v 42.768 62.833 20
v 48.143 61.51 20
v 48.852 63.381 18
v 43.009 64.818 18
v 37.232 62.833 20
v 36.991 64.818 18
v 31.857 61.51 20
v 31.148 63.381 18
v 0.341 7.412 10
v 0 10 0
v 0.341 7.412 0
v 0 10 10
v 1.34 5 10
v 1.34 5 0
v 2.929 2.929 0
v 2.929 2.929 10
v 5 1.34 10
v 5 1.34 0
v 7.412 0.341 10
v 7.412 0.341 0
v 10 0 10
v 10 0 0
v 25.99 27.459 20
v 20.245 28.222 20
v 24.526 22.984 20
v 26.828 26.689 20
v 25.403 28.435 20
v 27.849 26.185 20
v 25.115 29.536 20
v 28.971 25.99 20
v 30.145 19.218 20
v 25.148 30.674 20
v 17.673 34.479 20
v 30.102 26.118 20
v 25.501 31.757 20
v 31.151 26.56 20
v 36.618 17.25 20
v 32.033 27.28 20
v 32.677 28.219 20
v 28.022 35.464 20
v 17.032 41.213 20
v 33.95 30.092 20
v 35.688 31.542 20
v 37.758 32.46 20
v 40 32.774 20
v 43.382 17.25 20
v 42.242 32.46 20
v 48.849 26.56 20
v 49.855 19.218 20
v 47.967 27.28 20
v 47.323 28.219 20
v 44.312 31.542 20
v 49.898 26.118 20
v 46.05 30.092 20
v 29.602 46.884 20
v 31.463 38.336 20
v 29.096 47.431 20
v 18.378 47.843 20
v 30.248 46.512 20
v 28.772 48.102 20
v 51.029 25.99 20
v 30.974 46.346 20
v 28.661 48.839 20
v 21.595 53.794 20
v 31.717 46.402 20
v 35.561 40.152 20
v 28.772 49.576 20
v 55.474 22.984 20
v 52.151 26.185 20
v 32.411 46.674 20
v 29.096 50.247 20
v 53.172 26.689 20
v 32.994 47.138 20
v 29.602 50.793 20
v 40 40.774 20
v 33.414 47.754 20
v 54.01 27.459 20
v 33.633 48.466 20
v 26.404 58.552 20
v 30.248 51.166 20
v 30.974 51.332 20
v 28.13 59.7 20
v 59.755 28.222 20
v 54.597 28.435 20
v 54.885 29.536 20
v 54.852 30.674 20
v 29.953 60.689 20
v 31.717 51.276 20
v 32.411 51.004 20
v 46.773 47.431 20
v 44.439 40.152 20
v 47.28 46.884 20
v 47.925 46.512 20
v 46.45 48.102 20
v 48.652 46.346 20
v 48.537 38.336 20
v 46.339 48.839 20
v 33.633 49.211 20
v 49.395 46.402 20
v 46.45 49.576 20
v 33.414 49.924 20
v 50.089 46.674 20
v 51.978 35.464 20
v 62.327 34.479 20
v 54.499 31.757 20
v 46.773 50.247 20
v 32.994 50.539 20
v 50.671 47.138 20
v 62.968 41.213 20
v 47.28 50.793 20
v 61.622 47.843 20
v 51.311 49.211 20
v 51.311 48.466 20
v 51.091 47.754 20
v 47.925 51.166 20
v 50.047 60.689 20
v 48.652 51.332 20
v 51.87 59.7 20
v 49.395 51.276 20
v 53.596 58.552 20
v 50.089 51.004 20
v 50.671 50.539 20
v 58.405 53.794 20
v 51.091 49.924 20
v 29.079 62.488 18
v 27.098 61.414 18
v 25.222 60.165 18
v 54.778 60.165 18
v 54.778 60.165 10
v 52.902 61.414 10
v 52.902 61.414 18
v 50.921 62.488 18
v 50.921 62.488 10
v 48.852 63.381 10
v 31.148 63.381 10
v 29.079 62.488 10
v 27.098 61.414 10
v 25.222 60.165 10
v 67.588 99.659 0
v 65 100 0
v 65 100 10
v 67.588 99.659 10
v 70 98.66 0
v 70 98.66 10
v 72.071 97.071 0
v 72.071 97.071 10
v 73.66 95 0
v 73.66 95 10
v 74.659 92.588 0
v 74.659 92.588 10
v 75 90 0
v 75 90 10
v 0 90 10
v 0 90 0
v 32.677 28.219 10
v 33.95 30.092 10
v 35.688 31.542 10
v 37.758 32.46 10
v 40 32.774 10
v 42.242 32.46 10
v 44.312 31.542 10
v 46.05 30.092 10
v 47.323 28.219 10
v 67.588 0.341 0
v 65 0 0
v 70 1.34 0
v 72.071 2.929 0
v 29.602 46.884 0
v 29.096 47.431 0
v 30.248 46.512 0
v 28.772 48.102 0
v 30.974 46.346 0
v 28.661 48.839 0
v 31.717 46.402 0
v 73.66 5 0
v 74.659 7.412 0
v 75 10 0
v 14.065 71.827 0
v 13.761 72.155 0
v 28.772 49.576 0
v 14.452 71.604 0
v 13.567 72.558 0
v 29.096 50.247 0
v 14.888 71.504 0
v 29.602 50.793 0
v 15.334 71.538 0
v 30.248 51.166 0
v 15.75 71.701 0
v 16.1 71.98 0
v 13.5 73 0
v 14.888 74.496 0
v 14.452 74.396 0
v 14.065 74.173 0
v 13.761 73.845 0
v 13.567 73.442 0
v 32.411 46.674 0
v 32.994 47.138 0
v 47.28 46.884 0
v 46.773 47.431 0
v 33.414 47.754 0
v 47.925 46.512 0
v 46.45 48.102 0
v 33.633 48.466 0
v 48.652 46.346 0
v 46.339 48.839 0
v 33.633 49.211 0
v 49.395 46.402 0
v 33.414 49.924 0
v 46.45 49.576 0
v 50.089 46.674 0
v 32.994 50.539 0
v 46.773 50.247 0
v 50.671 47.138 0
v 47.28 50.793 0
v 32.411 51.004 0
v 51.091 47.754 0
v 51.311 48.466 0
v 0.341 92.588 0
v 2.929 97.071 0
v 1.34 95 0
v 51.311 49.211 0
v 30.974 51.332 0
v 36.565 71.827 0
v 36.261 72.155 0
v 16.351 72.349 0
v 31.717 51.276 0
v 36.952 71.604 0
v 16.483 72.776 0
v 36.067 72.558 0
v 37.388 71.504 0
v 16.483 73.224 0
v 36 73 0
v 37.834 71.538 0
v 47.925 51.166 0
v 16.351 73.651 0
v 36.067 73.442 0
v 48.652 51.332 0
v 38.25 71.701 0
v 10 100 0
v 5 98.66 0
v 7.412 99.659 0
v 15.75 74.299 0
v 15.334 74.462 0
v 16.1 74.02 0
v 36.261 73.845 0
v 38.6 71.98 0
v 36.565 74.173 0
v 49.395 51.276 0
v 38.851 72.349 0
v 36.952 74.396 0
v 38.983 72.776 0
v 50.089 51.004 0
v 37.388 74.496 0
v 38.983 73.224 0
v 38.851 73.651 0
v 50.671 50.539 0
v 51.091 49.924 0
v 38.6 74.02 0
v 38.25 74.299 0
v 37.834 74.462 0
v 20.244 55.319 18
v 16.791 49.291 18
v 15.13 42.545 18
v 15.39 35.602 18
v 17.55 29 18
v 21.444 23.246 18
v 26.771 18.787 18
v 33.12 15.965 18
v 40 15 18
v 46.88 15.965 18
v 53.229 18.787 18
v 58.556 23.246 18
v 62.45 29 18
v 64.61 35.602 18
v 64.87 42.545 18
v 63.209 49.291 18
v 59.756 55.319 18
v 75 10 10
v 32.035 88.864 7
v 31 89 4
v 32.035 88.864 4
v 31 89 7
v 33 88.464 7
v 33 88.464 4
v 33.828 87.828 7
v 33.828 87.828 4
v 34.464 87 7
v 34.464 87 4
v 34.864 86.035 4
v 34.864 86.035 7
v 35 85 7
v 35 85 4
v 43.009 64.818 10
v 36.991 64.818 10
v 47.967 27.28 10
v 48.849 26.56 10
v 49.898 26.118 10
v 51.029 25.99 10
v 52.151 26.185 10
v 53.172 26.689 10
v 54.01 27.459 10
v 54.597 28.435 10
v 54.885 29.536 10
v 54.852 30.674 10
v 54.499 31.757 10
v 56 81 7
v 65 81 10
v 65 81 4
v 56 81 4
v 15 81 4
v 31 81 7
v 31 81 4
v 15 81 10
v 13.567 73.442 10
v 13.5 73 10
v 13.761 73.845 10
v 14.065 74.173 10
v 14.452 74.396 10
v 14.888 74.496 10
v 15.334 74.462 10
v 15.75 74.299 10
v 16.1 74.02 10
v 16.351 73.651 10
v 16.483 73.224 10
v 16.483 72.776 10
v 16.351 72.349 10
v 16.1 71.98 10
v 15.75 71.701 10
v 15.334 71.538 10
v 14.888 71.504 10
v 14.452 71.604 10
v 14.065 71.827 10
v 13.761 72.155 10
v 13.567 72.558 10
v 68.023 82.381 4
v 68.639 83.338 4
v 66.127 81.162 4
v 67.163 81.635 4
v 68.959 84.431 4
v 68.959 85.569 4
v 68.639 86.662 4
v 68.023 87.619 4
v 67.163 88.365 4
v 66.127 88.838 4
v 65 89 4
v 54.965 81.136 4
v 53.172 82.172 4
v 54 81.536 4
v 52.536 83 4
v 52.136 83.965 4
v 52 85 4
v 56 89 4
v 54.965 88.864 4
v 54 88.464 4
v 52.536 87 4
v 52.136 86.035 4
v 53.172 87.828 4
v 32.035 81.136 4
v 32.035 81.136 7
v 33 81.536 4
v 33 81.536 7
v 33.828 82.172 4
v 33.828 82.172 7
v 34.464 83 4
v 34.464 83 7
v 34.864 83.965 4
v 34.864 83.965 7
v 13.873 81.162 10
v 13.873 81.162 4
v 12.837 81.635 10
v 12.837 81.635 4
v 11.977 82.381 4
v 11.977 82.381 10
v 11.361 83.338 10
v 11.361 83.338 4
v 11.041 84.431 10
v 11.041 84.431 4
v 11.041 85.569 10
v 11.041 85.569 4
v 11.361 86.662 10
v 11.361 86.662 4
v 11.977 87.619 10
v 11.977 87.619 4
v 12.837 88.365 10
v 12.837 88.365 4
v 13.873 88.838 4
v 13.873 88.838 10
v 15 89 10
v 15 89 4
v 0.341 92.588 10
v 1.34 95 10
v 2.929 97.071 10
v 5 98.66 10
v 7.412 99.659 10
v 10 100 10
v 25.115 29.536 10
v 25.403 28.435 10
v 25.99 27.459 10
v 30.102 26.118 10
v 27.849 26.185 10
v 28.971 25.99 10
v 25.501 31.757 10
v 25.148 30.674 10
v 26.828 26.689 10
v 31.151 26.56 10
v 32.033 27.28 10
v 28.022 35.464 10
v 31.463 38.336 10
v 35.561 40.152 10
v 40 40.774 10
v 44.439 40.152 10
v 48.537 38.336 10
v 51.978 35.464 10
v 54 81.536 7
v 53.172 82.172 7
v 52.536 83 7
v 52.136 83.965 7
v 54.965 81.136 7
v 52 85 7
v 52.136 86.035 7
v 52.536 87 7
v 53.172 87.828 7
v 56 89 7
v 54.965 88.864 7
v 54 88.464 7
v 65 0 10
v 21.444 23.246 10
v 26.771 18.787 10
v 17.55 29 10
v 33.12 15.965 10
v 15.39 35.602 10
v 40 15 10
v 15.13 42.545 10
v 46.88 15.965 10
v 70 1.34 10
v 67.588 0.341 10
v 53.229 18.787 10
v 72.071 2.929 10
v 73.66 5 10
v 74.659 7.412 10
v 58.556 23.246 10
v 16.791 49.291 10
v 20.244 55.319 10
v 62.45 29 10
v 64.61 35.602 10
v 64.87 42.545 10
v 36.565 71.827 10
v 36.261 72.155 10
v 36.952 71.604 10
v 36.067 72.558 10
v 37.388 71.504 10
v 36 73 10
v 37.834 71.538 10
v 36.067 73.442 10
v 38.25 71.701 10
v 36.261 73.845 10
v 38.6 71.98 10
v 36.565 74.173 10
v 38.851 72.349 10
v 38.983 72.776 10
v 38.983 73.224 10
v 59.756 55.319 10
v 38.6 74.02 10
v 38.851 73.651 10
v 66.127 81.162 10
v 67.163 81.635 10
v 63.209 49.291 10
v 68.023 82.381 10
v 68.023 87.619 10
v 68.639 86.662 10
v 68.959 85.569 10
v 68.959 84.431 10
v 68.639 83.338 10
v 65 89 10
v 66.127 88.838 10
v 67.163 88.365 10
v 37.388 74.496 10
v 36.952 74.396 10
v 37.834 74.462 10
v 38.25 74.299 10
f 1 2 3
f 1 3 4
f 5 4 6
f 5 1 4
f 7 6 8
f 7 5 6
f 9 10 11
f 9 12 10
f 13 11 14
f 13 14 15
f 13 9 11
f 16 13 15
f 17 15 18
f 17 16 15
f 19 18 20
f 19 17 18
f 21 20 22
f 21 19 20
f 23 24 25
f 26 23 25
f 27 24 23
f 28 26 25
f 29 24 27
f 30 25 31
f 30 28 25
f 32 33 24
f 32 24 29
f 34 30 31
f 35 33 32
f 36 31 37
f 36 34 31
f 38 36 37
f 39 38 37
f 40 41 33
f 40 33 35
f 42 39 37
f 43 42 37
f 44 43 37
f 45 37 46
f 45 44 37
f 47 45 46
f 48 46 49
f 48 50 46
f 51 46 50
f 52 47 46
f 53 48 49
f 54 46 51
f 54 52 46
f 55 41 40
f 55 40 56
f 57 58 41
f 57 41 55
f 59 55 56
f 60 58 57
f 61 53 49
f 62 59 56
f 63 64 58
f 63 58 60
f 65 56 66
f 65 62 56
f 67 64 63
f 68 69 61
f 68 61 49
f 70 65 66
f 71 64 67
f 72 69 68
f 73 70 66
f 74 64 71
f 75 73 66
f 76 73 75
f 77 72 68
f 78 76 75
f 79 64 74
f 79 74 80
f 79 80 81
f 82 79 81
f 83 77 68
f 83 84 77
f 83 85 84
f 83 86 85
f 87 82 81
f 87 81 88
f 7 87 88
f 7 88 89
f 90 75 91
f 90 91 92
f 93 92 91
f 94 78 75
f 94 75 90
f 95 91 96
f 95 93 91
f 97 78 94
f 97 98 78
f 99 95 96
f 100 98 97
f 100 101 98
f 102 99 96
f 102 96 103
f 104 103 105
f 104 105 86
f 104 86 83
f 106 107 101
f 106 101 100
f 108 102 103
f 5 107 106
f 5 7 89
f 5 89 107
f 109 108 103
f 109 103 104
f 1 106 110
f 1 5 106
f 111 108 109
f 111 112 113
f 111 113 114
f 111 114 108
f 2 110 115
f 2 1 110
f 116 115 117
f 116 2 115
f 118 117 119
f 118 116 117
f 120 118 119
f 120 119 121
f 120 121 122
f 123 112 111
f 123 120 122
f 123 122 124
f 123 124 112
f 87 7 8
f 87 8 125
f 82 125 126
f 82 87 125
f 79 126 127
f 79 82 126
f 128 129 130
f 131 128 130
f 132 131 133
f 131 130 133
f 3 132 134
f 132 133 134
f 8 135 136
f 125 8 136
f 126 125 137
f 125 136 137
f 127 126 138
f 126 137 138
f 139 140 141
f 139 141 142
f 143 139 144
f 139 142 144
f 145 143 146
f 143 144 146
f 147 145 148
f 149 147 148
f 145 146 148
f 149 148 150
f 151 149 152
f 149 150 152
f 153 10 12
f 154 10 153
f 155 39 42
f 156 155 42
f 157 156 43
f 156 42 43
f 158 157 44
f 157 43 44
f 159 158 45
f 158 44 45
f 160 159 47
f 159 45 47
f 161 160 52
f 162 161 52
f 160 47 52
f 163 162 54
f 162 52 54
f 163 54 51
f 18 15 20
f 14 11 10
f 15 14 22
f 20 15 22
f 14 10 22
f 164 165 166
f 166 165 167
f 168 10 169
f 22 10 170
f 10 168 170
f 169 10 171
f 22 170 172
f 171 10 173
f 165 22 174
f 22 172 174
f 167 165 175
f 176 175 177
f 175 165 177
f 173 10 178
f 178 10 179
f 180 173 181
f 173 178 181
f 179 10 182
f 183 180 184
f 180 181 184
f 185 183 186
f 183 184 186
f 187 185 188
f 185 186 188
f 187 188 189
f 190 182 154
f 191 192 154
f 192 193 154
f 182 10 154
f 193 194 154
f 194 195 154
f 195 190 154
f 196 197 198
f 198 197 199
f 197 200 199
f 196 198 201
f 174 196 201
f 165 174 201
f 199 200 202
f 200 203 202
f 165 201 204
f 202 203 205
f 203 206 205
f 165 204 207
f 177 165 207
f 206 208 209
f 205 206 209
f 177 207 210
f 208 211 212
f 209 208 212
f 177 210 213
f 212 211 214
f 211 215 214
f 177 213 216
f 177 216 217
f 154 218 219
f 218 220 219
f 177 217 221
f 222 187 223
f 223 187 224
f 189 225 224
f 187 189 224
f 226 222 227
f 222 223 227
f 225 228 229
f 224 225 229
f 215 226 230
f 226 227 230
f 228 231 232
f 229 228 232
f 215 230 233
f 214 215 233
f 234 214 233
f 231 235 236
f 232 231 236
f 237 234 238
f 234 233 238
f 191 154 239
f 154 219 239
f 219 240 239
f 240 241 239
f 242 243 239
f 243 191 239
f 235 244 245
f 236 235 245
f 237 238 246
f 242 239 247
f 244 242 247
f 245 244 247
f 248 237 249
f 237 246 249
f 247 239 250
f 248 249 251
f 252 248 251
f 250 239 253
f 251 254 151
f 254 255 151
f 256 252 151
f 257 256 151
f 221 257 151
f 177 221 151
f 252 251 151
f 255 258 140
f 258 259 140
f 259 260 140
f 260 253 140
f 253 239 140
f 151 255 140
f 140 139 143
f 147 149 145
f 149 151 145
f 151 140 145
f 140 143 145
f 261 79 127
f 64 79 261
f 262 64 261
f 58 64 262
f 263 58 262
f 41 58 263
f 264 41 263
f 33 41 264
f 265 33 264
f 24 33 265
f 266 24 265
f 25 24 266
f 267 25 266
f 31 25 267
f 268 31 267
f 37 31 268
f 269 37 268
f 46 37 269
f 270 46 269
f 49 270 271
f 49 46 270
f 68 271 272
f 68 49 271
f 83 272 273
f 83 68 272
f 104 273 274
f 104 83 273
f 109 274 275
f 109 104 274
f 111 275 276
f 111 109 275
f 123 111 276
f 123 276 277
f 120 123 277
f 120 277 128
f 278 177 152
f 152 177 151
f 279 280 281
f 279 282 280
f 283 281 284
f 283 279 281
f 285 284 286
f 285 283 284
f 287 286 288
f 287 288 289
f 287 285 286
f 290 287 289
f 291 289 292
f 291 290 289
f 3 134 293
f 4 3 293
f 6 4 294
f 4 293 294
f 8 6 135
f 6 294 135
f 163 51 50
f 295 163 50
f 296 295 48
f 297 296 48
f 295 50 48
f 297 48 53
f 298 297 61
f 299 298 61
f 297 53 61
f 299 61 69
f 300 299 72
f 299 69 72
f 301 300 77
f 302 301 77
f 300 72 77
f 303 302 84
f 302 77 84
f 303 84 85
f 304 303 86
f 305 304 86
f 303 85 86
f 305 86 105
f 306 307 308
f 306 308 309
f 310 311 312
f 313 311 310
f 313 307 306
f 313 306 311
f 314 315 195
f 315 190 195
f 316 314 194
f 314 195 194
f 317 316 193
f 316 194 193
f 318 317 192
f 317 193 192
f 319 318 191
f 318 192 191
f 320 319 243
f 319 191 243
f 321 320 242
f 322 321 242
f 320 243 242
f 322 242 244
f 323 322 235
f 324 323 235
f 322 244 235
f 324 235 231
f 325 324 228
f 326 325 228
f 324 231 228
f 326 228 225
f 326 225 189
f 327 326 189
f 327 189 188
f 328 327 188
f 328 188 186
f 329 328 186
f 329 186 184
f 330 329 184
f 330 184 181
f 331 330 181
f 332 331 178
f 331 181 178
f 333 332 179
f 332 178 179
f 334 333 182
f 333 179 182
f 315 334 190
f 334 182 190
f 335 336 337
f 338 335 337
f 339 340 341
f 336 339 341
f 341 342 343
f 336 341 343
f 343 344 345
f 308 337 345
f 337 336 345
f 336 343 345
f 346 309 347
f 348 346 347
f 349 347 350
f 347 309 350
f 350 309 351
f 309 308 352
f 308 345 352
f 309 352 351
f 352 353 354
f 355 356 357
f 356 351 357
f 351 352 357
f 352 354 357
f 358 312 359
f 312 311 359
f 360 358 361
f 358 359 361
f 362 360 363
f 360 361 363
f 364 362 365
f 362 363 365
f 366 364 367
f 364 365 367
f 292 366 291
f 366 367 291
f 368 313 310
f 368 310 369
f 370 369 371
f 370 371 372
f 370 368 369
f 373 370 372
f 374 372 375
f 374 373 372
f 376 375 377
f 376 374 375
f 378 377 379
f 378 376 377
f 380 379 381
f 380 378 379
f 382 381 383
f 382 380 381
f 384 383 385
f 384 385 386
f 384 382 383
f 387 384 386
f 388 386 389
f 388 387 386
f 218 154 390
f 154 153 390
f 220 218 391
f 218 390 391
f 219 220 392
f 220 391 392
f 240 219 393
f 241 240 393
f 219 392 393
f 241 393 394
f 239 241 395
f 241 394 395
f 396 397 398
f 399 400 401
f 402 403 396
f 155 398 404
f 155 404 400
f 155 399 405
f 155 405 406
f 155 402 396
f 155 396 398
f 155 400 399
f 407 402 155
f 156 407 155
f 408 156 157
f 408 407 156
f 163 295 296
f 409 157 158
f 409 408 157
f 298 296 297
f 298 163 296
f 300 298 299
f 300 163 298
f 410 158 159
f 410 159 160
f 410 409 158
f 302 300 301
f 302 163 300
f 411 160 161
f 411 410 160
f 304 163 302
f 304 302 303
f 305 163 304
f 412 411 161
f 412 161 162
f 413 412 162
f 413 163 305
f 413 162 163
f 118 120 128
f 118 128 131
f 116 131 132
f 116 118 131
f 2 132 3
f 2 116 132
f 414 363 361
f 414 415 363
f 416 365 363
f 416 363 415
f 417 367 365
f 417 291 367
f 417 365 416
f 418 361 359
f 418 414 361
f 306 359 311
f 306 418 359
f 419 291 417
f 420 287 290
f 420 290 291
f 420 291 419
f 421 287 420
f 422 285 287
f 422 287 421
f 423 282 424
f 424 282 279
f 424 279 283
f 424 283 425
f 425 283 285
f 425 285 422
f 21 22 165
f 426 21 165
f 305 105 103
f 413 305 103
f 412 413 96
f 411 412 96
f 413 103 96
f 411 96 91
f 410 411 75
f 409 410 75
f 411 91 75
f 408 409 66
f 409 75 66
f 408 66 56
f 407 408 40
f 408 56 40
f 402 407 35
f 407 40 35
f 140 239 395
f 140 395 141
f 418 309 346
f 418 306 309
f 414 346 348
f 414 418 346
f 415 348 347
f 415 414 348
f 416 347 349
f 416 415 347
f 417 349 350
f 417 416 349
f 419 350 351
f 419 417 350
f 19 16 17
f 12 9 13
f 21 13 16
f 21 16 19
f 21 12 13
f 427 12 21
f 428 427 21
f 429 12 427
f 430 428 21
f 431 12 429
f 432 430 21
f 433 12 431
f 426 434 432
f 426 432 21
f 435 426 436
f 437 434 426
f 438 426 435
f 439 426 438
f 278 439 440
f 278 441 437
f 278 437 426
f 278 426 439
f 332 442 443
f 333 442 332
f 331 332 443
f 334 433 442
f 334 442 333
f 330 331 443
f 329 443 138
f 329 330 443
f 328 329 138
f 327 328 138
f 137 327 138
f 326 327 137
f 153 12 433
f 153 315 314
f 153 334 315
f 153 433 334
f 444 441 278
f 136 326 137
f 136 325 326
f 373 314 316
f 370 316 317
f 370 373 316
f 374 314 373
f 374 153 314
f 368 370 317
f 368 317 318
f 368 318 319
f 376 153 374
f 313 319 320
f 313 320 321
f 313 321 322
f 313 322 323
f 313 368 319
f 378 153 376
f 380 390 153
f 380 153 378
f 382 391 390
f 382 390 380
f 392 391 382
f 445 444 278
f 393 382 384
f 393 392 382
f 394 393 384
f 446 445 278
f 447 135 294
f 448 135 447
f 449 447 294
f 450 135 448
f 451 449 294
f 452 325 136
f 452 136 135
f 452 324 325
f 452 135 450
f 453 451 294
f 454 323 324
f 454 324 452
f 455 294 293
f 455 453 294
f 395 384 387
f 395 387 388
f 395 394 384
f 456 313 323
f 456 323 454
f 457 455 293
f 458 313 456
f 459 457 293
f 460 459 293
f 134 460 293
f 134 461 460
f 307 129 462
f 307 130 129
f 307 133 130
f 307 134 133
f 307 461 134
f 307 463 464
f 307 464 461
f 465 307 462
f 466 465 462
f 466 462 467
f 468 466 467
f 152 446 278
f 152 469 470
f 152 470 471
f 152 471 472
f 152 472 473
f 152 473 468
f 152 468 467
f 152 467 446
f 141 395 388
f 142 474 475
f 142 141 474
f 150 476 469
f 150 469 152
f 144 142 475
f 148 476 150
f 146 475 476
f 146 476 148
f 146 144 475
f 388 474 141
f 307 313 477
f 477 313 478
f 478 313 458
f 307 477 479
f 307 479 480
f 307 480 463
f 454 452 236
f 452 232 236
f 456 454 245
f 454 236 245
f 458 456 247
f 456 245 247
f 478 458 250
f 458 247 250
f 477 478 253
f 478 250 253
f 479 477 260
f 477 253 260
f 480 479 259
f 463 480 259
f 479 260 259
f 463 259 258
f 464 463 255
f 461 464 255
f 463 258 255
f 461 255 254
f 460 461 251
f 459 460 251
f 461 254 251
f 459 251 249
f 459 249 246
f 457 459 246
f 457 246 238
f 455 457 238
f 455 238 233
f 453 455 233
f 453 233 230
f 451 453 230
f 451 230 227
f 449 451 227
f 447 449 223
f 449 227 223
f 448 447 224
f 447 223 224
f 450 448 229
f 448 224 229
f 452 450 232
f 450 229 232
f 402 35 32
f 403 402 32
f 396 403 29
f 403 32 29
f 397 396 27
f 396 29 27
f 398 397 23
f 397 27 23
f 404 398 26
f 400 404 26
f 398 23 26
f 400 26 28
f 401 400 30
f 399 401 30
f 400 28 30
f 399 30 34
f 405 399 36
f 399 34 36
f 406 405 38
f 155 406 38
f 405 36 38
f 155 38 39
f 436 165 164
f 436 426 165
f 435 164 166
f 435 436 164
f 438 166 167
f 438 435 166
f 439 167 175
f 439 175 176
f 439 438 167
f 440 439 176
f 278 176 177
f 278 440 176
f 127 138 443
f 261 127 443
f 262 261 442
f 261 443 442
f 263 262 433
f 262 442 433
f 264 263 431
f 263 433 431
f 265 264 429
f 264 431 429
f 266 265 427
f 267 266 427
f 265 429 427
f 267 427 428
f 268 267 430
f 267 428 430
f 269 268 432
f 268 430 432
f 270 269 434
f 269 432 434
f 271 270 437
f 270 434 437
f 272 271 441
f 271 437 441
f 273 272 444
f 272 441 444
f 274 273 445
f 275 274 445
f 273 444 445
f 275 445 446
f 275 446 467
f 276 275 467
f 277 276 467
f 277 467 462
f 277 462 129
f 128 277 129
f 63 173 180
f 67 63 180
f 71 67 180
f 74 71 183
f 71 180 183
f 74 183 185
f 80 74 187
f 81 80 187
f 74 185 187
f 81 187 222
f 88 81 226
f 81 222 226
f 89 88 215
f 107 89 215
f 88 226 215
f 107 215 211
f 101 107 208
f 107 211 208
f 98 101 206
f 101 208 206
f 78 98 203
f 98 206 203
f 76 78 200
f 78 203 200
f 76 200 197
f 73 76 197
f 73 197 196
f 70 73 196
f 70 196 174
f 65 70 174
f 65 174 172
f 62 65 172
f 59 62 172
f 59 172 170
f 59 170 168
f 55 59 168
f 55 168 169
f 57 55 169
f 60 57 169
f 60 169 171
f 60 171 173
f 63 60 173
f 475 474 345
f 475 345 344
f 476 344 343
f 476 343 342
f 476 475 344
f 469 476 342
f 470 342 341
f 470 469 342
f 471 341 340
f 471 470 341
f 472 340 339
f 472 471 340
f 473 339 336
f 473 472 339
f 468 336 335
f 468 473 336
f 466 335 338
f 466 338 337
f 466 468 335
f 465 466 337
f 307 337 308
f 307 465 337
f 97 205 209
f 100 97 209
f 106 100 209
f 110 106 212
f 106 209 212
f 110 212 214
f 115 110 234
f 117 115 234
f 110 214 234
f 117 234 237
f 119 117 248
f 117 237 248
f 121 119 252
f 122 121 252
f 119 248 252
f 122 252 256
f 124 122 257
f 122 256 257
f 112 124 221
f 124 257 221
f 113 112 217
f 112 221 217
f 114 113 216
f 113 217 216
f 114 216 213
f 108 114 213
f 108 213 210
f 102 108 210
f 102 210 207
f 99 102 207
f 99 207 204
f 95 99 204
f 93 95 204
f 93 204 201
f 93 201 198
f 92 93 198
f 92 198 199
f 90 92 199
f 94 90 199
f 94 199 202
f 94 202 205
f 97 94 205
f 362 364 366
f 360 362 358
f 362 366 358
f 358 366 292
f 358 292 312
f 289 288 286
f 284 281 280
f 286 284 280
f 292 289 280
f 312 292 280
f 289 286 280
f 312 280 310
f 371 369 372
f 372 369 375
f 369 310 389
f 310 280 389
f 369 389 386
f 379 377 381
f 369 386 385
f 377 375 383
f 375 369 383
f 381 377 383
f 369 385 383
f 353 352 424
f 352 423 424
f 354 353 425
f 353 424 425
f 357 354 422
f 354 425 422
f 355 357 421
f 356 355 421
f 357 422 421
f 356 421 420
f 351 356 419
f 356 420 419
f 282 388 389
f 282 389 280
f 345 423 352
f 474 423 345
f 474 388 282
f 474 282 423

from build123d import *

# Parameters (mm, degrees)
SKETCH2_W                    = 75
SKETCH2_H                    = 100
BOSS_EXTRUDE1_DEPTH          = 10
BOSS_EXTRUDE4_DEPTH          = 10
F_5_0_5_DIAMETER_HOLE1_D     = 5
CUT_EXTRUDE1_DEPTH           = 6
FILLET1_R                    = 10
F_3_0_3_DIAMETER_HOLE1_D     = 3
F_3_0_3_DIAMETER_HOLE1_DEPTH = 10
F_3_0_3_DIAMETER_HOLE1_TIP   = 0.901290929
SKETCH18_W                   = 17
SKETCH18_H                   = 8
BOSS_EXTRUDE5_DEPTH          = 3
FILLET2_R                    = 4
CUT_EXTRUDE2_DEPTH           = 10
CHAMFER1_SIZE                = 2


with BuildPart() as part:
    # Sketch2 → Boss-Extrude1 (new body)
    with BuildSketch(Plane.XY):
        with Locations((37.5, 50)):
            Rectangle(SKETCH2_W, SKETCH2_H)
    extrude(amount=BOSS_EXTRUDE1_DEPTH)

    # Sketch5 → Boss-Extrude4 (add)
    with BuildSketch(Plane.XY.offset(10)):
        with BuildLine():
            ThreePointArc((25.222170949, 60.16471593), (40, 15), (54.777829051, 60.16471593))
            ThreePointArc((54.777829051, 60.16471593), (51.923594578, 61.973345042), (48.851534275, 63.380554762))
            ThreePointArc((48.851534275, 63.380554762), (40, 65), (31.148465725, 63.380554762))
            ThreePointArc((31.148465725, 63.380554762), (28.076405422, 61.973345042), (25.222170949, 60.16471593))
        make_face()
    extrude(amount=BOSS_EXTRUDE4_DEPTH)

    # Ø5.0 (5) Diameter Hole1 (through all)
    with Locations(Plane.XY.offset(20)):
        with Locations((31.161165235, 48.838834765), (48.838834765, 48.838834765)):
            Hole(F_5_0_5_DIAMETER_HOLE1_D / 2)

    # Sketch12 → Cut-Extrude1 (cut)
    with BuildSketch(Plane.XY.offset(10)):
        with BuildLine():
            Line((15, 89), (65, 89))
            ThreePointArc((65, 89), (69, 85), (65, 81))
            Line((65, 81), (15, 81))
            ThreePointArc((15, 81), (11, 85), (15, 89))
        make_face()
    extrude(amount=-CUT_EXTRUDE1_DEPTH, mode=Mode.SUBTRACT)

    # Fillet1
    fillet1_edges = [part.edges().sort_by_distance(p)[0] for p in [
        (0, 100, 5),
        (75, 100, 5),
        (75, 0, 5),
        (0, 0, 5),
    ]]
    fillet(fillet1_edges, radius=FILLET1_R)

    # Ø3.0 (3) Diameter Hole1
    with Locations(Plane.XY.offset(10)):
        with Locations((15, 73), (37.5, 73)):
            Hole(F_3_0_3_DIAMETER_HOLE1_D / 2, depth=F_3_0_3_DIAMETER_HOLE1_DEPTH)
            with Locations((0, 0, -(F_3_0_3_DIAMETER_HOLE1_DEPTH + F_3_0_3_DIAMETER_HOLE1_TIP / 2))):  # 118° drill point
                Cone(0, F_3_0_3_DIAMETER_HOLE1_D / 2, F_3_0_3_DIAMETER_HOLE1_TIP, mode=Mode.SUBTRACT)

    # Sketch18 → Boss-Extrude5 (add)
    with BuildSketch(Plane.XY.offset(4)):
        with Locations((43.5, 85)):
            Rectangle(SKETCH18_W, SKETCH18_H)
    extrude(amount=BOSS_EXTRUDE5_DEPTH)

    # Fillet2
    fillet2_edges = [part.edges().sort_by_distance(p)[0] for p in [
        (52, 81, 5.5),
        (52, 89, 5.5),
        (35, 81, 5.5),
        (35, 89, 5.5),
    ]]
    fillet(fillet2_edges, radius=FILLET2_R - 0.0001)  # a hair under: the kernel refuses the full size

    # Sketch20 → Cut-Extrude2 (cut)
    with BuildSketch(Plane.XY.offset(20)):
        with BuildLine():
            ThreePointArc((54.498623519, 31.756776834), (40, 40.773853631), (25.501376481, 31.756776834))
            ThreePointArc((25.501376481, 31.756776834), (27.320380503, 26.400357846), (32.67679949, 28.219361868))
            ThreePointArc((32.67679949, 28.219361868), (40, 32.773853631), (47.32320051, 28.219361868))
            ThreePointArc((47.32320051, 28.219361868), (52.679619497, 26.400357846), (54.498623519, 31.756776834))
        make_face()
    extrude(amount=-CUT_EXTRUDE2_DEPTH, mode=Mode.SUBTRACT)

    # Chamfer1
    chamfer1_edges = [part.edges().sort_by_distance(p)[0] for p in [
        (25.222170949, 19.83528407, 20),
    ]]
    chamfer(chamfer1_edges, length=CHAMFER1_SIZE)


solid = part.part
